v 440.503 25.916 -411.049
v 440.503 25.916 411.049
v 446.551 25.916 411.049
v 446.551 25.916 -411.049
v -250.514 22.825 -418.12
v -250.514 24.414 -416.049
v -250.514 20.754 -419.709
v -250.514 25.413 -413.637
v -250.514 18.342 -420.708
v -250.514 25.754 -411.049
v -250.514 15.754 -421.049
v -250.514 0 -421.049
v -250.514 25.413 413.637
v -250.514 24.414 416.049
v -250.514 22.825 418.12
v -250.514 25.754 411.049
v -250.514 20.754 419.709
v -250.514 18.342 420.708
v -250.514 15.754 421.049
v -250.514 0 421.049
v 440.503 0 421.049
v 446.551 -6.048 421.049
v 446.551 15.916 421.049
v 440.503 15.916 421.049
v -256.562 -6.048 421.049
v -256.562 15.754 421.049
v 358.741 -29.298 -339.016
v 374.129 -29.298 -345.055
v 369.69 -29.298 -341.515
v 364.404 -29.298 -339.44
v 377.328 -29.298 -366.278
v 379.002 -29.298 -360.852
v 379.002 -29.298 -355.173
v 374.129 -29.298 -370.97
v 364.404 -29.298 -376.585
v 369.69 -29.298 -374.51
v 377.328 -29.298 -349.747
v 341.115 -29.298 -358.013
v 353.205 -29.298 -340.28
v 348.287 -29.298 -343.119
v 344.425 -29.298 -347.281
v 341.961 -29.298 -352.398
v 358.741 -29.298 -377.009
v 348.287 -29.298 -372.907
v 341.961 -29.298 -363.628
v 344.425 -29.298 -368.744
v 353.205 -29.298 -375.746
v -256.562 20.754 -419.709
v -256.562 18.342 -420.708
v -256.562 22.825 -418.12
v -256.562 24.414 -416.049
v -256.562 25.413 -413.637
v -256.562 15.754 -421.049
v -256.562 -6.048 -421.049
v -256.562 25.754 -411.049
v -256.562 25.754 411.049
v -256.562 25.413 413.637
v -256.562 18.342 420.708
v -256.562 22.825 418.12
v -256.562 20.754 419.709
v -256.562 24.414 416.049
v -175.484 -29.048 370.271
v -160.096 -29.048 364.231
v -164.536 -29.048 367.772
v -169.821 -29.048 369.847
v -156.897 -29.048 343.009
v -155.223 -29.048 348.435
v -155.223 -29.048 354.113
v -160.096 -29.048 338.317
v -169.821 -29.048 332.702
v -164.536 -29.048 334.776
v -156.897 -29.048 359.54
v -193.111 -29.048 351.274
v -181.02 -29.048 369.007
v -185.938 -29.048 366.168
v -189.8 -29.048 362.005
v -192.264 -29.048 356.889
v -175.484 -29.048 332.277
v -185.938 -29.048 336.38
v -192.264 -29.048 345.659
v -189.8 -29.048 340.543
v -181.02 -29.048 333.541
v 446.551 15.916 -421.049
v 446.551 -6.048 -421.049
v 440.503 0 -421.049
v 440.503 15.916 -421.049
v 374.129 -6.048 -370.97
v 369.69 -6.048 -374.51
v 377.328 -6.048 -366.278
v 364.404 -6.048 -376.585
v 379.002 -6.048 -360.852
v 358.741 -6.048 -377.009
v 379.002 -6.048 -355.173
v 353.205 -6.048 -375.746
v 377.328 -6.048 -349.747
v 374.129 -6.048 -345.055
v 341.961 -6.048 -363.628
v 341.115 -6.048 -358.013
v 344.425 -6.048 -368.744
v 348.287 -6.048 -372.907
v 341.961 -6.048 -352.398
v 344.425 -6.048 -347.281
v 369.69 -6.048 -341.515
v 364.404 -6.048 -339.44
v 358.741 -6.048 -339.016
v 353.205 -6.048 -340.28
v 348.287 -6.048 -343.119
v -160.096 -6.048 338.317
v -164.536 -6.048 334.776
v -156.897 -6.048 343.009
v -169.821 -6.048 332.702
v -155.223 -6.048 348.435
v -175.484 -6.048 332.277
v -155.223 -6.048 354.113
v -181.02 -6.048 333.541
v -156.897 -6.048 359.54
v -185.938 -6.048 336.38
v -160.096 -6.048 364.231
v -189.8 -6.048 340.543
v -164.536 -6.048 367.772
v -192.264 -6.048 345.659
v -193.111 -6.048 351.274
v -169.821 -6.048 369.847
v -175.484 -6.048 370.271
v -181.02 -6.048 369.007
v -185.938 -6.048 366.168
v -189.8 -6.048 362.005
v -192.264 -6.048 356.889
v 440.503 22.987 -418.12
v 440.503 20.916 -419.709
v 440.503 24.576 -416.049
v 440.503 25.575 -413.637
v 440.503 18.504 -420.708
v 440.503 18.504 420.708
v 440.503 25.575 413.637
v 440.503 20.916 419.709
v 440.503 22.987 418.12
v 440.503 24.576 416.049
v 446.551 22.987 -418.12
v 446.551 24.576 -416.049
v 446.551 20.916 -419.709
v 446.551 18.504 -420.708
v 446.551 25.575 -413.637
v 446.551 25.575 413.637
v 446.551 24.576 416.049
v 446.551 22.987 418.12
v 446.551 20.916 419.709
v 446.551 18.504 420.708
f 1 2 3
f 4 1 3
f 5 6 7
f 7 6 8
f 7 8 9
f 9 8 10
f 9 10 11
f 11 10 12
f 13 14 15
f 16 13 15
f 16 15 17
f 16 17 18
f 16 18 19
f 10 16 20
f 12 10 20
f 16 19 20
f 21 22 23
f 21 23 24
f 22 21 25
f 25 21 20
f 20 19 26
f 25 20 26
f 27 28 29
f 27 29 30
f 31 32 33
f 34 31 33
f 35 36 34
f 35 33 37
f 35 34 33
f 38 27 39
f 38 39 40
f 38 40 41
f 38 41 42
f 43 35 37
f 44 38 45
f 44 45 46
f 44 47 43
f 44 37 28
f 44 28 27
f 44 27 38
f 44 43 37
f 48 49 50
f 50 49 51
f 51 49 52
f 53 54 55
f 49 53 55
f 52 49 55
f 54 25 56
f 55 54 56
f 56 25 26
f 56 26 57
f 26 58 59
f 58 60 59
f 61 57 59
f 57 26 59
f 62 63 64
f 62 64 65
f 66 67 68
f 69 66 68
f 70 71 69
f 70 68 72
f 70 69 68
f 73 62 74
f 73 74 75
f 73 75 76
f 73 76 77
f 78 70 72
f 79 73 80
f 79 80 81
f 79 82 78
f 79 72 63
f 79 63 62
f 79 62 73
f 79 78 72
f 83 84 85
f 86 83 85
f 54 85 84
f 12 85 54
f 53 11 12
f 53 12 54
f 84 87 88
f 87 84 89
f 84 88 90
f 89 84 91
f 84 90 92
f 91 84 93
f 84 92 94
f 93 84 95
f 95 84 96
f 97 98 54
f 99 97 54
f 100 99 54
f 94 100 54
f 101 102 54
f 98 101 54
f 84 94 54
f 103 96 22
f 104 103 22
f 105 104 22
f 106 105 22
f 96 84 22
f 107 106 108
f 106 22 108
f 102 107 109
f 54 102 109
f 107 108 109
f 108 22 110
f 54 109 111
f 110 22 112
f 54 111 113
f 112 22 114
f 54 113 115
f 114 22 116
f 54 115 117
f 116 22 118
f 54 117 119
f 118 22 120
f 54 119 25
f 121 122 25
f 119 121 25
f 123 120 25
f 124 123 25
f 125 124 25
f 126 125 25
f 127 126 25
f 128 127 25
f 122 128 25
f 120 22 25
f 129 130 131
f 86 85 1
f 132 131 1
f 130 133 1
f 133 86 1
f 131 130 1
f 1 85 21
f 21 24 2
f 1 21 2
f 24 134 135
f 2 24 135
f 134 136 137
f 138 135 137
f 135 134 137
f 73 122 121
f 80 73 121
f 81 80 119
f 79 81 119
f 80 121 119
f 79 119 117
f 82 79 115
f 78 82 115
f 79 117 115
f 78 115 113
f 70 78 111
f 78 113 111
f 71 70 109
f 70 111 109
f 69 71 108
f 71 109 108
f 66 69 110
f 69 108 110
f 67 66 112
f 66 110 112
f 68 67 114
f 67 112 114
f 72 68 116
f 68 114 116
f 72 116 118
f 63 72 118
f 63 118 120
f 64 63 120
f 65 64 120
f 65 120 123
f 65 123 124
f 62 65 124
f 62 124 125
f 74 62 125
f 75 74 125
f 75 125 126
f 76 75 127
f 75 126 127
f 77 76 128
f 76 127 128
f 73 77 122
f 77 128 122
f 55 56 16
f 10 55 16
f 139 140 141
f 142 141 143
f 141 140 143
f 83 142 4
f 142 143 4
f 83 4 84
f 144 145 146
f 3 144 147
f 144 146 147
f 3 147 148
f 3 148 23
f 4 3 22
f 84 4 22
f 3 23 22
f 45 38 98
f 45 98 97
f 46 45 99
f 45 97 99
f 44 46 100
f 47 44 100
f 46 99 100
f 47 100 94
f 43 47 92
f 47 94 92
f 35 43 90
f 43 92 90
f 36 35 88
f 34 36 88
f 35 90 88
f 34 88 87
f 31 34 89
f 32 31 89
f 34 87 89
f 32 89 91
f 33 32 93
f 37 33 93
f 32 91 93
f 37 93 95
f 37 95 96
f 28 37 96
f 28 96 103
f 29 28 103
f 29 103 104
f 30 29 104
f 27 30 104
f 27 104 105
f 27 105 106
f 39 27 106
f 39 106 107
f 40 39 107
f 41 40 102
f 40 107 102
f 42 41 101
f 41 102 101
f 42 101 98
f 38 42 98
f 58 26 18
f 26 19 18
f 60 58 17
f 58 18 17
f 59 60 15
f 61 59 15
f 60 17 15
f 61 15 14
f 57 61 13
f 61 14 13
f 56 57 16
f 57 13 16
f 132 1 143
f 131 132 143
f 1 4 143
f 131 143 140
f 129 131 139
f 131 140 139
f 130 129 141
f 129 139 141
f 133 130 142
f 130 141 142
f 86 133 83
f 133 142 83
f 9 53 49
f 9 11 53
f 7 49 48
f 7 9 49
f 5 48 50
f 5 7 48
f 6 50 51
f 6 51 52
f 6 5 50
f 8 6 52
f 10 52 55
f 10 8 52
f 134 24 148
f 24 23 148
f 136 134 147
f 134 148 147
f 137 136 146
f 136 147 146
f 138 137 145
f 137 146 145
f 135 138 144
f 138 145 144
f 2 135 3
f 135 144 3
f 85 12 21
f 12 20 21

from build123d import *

# Parameters (mm, degrees)
EXTRUDE_THIN1_DEPTH = 421.049210887
FILLET1_R           = 10
SKETCH_2_R          = 19.05
EXTRUDE_1_DEPTH     = 23.24974156
SKETCH_3_R          = 19.05
EXTRUDE_2_DEPTH     = 23


with BuildPart() as part:
    # Sketch1 → Extrude-Thin1 (new body, symmetric)
    with BuildSketch(Plane.XY):
        Polygon((-250.514148937, 25.753634758), (-250.514148937, 0), (440.503291061, 0), (440.503291061, 25.915671281), (446.551474959, 25.915671281), (446.551474959, -6.048183898), (-256.562332835, -6.048183898), (-256.562332835, 25.753634758), align=None)
    extrude(amount=EXTRUDE_THIN1_DEPTH, both=True)

    # Fillet1
    fillet1_edges = [part.edges().sort_by_distance(p)[0] for p in [
        (-253.538240886, 25.753634758, 421.049210887),
        (443.52738301, 25.915671281, 421.049210887),
        (-253.538240886, 25.753634758, -421.049210887),
        (443.52738301, 25.915671281, -421.049210887),
    ]]
    fillet(fillet1_edges, radius=FILLET1_R)

    # 草图2 → 凸台-拉伸1 (add)
    with BuildSketch(Plane(origin=(0, -6.048183898, 0), x_dir=(-1, 0, 0), z_dir=(0, -1, 0))):
        with Locations((-360.164689426, 358.012657815)):
            Circle(SKETCH_2_R)
    extrude(amount=EXTRUDE_1_DEPTH)

    # 草图3 → 凸台-拉伸2 (add)
    with BuildSketch(Plane(origin=(0, -6.048183898, 0), x_dir=(-1, 0, 0), z_dir=(0, -1, 0))):
        with Locations((174.06050089, -351.274172881)):
            Circle(SKETCH_3_R)
    extrude(amount=EXTRUDE_2_DEPTH)


solid = part.part
